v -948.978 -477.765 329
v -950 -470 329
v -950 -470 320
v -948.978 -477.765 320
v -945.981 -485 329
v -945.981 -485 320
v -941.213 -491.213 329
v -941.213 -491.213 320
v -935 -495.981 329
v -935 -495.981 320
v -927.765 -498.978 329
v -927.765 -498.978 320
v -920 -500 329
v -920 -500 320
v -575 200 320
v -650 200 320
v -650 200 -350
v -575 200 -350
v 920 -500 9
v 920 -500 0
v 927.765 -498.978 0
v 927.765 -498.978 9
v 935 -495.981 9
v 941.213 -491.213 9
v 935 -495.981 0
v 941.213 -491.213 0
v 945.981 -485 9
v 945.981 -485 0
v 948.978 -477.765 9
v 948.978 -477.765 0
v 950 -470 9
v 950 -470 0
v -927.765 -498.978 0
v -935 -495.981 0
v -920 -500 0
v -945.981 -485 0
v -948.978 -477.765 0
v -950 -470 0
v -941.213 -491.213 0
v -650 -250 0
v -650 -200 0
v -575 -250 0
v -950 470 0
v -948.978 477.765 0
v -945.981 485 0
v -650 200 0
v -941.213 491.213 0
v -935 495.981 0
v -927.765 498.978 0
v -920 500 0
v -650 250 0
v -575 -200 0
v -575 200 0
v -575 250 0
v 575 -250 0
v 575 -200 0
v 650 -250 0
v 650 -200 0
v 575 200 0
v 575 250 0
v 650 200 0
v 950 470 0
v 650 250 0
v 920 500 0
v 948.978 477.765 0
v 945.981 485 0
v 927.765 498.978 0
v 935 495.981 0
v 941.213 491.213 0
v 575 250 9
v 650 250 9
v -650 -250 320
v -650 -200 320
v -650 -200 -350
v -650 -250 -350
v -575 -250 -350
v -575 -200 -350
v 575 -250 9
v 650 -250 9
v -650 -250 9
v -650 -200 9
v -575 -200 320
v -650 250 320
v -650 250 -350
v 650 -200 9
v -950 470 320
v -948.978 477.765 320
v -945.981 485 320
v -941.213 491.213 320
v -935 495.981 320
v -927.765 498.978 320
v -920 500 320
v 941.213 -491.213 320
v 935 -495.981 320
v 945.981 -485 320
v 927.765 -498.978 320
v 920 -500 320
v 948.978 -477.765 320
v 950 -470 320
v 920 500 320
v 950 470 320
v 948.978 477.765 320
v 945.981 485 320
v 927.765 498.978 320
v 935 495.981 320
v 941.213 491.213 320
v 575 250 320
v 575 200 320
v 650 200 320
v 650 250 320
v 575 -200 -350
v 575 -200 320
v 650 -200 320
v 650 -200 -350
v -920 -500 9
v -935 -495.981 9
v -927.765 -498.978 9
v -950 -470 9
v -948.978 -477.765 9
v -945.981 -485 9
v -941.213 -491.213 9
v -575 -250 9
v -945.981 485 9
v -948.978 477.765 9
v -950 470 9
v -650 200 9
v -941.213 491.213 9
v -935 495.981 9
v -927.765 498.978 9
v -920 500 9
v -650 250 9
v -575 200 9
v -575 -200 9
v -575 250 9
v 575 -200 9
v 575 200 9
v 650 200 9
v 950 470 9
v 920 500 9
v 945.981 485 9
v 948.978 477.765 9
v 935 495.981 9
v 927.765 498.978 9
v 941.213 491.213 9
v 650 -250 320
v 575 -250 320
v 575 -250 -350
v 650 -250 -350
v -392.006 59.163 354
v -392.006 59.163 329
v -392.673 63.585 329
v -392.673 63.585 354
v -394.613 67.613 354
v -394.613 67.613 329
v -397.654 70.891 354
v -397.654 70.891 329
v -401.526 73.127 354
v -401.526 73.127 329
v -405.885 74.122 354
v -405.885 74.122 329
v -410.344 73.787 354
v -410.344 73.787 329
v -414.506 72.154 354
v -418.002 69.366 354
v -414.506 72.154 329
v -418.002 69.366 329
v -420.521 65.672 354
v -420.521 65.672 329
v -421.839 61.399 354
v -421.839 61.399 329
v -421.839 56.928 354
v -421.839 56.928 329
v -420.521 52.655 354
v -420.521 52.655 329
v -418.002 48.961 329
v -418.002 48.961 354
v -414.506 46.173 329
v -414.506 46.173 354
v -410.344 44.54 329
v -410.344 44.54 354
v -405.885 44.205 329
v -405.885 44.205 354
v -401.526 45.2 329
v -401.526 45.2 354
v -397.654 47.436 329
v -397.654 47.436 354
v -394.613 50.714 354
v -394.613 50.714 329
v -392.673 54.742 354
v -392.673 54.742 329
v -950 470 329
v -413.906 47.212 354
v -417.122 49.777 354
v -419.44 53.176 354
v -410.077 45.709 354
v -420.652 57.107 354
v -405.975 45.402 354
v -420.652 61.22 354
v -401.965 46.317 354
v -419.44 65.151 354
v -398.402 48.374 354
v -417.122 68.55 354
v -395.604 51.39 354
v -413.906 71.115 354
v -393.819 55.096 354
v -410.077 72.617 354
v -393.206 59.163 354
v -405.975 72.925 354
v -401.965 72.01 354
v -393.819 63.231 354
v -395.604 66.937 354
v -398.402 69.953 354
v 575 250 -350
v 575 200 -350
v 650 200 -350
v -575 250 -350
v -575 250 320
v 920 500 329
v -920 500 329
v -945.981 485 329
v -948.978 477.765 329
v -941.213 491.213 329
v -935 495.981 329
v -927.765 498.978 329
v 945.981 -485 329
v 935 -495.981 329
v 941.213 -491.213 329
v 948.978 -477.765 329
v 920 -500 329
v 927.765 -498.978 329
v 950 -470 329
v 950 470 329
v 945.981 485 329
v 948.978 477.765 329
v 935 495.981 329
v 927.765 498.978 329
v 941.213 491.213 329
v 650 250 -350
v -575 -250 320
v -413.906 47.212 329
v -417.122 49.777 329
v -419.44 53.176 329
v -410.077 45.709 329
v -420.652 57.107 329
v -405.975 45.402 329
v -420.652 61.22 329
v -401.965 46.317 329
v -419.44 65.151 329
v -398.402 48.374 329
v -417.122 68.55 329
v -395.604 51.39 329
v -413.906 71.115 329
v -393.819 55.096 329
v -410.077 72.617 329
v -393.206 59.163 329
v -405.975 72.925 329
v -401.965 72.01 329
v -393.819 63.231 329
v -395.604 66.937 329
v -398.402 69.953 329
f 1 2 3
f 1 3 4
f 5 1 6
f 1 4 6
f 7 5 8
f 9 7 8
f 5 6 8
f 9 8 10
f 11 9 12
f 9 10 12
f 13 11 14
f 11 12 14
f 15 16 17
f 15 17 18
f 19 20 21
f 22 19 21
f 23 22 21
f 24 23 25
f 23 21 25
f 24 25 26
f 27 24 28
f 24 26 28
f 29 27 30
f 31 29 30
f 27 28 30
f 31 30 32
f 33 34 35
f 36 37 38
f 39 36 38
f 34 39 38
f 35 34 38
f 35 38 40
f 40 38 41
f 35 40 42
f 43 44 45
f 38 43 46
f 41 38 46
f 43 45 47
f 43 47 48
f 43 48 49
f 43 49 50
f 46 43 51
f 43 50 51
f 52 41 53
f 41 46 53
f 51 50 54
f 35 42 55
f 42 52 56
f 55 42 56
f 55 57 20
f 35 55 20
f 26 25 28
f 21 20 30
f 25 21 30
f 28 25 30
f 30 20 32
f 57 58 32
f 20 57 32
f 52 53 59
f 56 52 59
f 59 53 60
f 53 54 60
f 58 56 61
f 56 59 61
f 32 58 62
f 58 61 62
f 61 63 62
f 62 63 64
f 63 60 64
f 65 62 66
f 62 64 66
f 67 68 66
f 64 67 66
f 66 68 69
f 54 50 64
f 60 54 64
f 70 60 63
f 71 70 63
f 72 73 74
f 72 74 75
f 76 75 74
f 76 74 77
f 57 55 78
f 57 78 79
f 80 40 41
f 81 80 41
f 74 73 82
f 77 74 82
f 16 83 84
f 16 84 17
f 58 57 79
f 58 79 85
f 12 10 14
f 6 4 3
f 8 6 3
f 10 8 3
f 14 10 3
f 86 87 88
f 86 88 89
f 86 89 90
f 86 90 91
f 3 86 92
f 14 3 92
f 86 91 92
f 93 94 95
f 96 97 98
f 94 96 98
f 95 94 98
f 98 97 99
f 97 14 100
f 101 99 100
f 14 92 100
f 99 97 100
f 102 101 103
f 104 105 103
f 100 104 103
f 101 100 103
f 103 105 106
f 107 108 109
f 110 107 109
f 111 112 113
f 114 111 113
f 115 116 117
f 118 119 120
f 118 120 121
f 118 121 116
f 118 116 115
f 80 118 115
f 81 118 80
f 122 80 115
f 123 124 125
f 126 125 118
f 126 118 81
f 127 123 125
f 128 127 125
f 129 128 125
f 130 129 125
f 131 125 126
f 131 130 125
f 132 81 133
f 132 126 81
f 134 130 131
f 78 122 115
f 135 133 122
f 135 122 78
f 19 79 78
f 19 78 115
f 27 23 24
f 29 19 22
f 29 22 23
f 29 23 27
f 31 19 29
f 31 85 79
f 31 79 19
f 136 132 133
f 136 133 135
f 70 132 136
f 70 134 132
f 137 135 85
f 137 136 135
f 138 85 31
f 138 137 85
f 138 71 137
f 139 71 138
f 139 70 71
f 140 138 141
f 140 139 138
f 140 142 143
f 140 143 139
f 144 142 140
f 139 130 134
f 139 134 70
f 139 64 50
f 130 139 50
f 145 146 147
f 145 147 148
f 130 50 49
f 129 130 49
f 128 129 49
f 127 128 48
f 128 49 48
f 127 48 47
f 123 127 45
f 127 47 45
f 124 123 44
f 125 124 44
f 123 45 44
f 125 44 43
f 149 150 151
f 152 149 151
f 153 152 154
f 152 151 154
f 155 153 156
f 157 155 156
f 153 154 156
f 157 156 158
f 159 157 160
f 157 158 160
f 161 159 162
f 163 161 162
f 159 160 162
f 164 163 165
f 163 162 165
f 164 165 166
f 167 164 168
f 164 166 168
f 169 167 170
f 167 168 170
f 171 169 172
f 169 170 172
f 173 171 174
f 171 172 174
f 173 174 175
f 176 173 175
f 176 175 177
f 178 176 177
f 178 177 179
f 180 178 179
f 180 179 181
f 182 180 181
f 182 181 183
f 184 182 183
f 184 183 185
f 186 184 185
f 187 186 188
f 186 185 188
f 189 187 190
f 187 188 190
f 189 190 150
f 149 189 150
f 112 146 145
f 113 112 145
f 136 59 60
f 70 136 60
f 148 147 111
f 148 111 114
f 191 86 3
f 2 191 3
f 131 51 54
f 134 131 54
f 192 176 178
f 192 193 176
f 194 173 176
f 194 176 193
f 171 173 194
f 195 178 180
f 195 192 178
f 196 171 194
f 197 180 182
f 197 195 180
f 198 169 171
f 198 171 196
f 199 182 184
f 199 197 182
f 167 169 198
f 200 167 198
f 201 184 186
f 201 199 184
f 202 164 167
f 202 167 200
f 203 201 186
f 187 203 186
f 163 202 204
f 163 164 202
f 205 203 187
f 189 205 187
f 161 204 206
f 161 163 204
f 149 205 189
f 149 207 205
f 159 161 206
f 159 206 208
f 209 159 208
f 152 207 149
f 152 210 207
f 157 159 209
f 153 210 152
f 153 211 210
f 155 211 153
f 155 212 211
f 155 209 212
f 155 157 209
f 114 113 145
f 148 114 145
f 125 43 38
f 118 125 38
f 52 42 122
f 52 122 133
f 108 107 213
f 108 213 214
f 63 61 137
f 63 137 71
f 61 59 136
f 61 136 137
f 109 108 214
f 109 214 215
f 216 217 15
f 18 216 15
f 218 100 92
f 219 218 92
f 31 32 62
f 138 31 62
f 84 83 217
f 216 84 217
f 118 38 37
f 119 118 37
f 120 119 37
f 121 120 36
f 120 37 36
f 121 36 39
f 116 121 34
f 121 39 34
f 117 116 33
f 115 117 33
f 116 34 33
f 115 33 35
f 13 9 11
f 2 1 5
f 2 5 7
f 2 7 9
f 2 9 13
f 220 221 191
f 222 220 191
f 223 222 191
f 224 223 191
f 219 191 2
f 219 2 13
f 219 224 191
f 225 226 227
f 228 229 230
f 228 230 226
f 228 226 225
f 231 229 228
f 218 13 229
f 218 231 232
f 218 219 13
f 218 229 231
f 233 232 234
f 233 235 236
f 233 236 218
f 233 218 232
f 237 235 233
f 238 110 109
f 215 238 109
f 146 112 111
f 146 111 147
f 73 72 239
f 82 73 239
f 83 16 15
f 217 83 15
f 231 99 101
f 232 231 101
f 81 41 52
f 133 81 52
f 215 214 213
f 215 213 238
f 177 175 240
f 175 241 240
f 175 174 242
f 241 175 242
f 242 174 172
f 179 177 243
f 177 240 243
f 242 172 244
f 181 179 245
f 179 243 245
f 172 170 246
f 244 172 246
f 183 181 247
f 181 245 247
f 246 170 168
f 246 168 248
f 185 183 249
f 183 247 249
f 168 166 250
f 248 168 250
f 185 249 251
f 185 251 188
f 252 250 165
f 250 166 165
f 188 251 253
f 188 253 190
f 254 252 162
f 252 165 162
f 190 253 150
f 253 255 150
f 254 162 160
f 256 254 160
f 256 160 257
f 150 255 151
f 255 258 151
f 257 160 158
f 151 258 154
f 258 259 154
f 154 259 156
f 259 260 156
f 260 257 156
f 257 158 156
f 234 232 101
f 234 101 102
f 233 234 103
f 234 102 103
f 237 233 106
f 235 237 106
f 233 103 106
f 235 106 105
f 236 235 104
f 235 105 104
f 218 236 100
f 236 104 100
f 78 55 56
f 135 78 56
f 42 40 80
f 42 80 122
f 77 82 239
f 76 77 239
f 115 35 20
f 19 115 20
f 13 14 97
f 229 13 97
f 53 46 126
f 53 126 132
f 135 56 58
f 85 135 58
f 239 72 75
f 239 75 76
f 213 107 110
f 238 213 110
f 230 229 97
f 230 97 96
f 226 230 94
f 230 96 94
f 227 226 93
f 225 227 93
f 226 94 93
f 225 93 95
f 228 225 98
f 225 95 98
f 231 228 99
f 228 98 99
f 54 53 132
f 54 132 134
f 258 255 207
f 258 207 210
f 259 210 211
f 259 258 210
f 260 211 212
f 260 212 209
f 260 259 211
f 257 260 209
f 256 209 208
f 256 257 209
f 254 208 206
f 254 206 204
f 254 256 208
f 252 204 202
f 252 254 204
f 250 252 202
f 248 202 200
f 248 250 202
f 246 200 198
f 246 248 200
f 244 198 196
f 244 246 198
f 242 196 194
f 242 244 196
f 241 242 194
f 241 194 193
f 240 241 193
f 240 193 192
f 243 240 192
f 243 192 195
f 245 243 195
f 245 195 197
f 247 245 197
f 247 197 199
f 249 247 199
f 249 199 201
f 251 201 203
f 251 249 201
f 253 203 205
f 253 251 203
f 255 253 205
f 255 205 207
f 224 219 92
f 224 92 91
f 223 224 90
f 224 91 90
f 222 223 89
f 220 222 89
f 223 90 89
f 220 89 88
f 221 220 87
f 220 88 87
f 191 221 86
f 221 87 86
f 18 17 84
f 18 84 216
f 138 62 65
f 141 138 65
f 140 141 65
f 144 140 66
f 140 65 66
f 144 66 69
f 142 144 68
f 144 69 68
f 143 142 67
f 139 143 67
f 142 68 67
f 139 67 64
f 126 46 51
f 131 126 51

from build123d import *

# Parameters (mm, degrees)
F0_W     = 75
F0_H     = 50
F1_DEPTH = 9
F4_DEPTH = 9
F5_W     = 75
F5_H     = 50
F6_DEPTH = 670
F7_R     = 15
F7_R_2   = 13.8
F8_DEPTH = 25


with BuildPart() as f1:
    # F0 (on Top) → F1 (new body)
    with BuildSketch(Plane.XY):
        with BuildLine():
            Line((920, 500), (-920, 500))
            ThreePointArc((-920, 500), (-941.213203, 491.213203), (-950, 470))
            Line((-950, 470), (-950, -470))
            ThreePointArc((-950, -470), (-941.213203, -491.213203), (-920, -500))
            Line((-920, -500), (920, -500))
            ThreePointArc((920, -500), (941.213203, -491.213203), (950, -470))
            Line((950, -470), (950, 470))
            ThreePointArc((950, 470), (941.213203, 491.213203), (920, 500))
        make_face()
        with Locations((-612.5, -225)):
            Rectangle(F0_W, F0_H, mode=Mode.SUBTRACT)
        with Locations((612.5, -225)):
            Rectangle(F0_W, F0_H, mode=Mode.SUBTRACT)
        with Locations((-612.5, 225)):
            Rectangle(F0_W, F0_H, mode=Mode.SUBTRACT)
        with Locations((612.5, 225)):
            Rectangle(F0_W, F0_H, mode=Mode.SUBTRACT)
    extrude(amount=F1_DEPTH)


with BuildPart() as f4:
    # F3 (on offset) → F4 (new body)
    with BuildSketch(Plane.XY.offset(320)):
        with BuildLine():
            Line((-950, 470), (-950, -470))
            ThreePointArc((-950, -470), (-941.213203, -491.213203), (-920, -500))
            Line((-920, -500), (920, -500))
            ThreePointArc((920, -500), (941.213203, -491.213203), (950, -470))
            Line((950, -470), (950, 470))
            ThreePointArc((950, 470), (941.213203, 491.213203), (920, 500))
            Line((920, 500), (-920, 500))
            ThreePointArc((-920, 500), (-941.213203, 491.213203), (-950, 470))
        make_face()
    extrude(amount=F4_DEPTH)


with BuildPart() as f6:
    # F5 (on face) → F6 (new body)
    with BuildSketch(Plane(origin=(0, 0, 320), x_dir=(1, 0, 0), z_dir=(0, 0, -1))):
        with Locations((-612.5, 225)):
            Rectangle(F5_W, F5_H)
        with Locations((612.5, 225)):
            Rectangle(F5_W, F5_H)
        with Locations((612.5, -225)):
            Rectangle(F5_W, F5_H)
        with Locations((-612.5, -225)):
            Rectangle(F5_W, F5_H)
    extrude(amount=F6_DEPTH)


with BuildPart() as f8:
    # F7 (on face) → F8 (new body)
    with BuildSketch(Plane.XY.offset(329)):
        with Locations((-407.006383, 59.163444)):
            Circle(F7_R)
        with Locations((-407.006383, 59.163444)):
            Circle(F7_R_2, mode=Mode.SUBTRACT)
    extrude(amount=F8_DEPTH)


solid = Compound([f1.part, f4.part, f6.part, f8.part])
